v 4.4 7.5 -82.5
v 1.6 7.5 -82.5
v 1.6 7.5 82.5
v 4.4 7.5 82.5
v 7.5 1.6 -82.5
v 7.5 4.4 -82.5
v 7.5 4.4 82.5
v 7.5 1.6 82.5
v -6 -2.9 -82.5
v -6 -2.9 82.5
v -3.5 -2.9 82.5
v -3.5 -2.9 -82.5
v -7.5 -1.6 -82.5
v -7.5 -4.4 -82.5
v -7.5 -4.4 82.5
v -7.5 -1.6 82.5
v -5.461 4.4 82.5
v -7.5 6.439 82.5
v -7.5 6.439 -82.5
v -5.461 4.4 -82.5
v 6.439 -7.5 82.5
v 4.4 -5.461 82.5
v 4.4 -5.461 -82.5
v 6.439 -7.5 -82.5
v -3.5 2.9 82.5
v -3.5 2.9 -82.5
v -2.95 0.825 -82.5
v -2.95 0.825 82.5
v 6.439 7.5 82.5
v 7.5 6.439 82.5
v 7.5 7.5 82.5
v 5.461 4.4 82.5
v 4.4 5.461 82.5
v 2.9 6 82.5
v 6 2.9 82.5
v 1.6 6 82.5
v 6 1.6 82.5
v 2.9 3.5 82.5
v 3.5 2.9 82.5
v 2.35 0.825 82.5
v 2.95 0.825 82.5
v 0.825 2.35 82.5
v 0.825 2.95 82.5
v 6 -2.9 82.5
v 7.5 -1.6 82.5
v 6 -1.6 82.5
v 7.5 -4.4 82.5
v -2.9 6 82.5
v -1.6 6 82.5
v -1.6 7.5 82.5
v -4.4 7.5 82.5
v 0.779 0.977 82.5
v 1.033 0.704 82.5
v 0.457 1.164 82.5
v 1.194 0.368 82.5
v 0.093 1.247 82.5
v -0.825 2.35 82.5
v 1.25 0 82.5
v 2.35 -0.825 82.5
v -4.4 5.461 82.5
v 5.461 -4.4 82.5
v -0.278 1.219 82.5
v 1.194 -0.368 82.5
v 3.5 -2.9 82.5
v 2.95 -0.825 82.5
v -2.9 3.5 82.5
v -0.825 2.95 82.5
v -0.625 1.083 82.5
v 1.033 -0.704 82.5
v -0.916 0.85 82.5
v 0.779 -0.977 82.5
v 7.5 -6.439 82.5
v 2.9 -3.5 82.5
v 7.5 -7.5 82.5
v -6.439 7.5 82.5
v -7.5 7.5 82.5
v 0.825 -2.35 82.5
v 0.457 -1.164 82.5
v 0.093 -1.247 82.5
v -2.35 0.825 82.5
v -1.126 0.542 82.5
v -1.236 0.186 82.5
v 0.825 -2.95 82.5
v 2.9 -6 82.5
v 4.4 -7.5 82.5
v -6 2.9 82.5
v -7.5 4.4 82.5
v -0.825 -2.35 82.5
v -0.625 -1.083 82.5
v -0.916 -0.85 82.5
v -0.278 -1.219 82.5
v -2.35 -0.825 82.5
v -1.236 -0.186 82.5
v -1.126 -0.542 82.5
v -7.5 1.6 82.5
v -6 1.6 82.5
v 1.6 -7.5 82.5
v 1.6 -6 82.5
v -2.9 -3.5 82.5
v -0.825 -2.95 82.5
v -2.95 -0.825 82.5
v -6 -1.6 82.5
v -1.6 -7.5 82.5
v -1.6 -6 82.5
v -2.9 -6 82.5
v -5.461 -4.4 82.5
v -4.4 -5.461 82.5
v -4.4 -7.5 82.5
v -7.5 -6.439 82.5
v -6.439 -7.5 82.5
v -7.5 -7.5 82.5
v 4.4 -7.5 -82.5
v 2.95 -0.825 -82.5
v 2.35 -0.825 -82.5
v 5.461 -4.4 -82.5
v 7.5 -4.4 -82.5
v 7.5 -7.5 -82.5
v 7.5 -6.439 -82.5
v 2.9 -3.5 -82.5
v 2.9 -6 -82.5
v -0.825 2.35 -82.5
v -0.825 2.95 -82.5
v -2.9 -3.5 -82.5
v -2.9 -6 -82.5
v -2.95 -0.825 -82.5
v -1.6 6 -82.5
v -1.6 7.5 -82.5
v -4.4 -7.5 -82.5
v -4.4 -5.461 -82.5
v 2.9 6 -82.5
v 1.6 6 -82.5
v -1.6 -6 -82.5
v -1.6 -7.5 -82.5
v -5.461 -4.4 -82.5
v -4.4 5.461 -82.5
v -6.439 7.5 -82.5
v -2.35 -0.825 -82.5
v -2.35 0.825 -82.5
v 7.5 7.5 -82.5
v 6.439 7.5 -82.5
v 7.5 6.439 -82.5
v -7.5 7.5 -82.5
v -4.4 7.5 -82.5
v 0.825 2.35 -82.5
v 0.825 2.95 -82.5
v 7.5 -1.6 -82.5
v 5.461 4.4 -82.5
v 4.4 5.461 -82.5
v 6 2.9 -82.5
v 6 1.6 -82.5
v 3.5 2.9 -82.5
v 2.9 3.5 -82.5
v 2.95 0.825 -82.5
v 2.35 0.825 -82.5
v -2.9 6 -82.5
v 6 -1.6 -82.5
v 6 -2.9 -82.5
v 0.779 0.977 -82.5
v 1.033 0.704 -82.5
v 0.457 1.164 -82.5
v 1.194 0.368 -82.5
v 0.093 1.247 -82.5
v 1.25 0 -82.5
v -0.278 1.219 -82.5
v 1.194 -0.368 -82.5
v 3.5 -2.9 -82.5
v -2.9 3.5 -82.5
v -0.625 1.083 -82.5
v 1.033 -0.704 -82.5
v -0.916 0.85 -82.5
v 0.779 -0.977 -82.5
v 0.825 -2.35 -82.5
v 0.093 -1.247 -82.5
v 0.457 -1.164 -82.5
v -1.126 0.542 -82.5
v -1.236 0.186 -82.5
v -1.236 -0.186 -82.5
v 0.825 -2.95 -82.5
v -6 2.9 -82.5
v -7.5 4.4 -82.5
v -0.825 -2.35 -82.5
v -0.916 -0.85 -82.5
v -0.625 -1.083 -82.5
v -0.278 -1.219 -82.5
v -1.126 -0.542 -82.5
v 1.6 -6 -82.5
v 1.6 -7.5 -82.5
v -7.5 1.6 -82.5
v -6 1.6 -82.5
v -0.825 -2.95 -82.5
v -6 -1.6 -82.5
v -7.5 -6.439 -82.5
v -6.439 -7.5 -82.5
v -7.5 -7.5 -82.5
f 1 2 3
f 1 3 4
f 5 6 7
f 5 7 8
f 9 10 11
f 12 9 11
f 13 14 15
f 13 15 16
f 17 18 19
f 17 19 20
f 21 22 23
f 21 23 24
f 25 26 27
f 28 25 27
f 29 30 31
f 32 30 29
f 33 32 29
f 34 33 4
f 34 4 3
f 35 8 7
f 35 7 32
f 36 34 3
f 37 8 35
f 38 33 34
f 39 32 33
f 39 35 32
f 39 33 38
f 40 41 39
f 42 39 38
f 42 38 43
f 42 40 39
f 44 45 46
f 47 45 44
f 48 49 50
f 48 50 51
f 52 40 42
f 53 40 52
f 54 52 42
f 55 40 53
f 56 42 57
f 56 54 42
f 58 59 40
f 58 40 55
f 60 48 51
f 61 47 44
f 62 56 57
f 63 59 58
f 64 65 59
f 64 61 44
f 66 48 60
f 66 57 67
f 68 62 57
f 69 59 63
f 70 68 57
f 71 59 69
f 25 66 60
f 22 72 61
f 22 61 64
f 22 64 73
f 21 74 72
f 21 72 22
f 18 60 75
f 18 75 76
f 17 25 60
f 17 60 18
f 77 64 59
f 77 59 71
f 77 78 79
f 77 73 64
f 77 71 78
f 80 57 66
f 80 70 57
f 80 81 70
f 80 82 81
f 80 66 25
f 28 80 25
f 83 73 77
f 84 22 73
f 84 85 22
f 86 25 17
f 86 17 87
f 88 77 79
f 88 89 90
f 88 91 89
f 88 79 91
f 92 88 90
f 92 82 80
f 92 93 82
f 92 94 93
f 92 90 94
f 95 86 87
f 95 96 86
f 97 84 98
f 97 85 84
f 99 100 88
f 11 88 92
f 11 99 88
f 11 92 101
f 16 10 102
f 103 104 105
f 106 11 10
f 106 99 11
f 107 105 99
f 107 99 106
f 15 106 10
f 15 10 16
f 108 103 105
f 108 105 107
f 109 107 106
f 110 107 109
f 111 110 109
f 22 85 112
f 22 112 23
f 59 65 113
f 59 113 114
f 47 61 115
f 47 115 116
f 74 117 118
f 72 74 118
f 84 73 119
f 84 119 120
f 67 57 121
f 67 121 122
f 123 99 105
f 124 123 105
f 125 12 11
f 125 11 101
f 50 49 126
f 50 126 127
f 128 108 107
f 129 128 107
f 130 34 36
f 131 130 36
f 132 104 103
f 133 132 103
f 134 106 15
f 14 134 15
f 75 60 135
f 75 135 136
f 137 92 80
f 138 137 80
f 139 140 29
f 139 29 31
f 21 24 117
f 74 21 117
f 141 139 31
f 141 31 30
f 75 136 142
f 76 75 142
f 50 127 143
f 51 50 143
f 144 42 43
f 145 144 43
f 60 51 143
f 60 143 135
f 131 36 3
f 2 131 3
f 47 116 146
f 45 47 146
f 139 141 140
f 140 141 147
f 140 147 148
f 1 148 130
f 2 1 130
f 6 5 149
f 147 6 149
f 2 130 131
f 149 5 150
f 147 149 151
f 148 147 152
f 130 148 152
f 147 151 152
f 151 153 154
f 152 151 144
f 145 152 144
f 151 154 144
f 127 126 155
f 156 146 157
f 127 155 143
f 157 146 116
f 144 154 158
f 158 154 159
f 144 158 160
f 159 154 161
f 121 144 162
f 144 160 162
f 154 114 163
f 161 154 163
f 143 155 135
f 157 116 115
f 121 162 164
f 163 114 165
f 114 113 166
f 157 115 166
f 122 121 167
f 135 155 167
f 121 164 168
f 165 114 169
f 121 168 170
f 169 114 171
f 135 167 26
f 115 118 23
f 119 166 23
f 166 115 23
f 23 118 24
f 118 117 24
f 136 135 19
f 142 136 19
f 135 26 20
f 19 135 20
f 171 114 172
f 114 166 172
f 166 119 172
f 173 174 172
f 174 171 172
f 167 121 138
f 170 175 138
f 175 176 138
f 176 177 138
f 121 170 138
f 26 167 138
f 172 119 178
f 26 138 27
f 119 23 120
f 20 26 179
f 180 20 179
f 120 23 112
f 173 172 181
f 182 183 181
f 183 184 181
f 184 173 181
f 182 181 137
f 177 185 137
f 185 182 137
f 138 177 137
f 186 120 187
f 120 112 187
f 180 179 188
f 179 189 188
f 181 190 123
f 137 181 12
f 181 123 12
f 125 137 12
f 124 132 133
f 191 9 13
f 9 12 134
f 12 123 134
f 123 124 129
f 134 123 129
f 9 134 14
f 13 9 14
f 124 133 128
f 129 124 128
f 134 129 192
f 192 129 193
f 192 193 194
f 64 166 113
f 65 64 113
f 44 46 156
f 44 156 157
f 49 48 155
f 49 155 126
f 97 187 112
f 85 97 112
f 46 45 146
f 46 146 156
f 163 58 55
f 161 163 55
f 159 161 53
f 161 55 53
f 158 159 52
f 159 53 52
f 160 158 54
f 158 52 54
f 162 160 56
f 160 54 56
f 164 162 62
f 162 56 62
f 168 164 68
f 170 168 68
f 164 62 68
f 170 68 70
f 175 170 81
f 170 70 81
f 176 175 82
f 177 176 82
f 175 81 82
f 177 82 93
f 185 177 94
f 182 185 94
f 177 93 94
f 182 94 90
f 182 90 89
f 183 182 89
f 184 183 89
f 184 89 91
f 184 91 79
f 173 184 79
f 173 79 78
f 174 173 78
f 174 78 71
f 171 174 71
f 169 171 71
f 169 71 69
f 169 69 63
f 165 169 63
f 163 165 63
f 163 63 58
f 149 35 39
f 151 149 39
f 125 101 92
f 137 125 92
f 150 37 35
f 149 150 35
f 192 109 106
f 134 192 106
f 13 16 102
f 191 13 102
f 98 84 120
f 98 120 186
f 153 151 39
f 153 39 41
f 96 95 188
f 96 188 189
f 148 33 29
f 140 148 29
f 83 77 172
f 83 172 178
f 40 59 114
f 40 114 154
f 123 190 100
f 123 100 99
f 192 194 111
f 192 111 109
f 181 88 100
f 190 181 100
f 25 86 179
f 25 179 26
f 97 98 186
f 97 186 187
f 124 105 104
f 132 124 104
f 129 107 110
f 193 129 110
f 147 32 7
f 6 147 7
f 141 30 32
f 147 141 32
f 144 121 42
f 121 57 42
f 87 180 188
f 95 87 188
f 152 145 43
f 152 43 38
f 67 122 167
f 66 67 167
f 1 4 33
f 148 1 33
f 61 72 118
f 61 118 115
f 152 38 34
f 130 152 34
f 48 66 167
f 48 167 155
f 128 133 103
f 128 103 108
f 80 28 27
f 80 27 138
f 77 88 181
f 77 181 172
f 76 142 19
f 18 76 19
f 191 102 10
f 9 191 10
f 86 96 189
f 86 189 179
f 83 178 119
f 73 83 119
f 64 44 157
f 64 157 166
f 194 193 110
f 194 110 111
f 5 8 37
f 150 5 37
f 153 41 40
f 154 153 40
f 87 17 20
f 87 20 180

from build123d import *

# Parameters (mm, degrees)
RESSALTO_EXTRUS_O1_DEPTH   = 82.5
ESPELHAR2_COPY_1_DEPTH     = 82.5
ESBO_O2_R                  = 1.25
CORTE_EXTRUS_O1_DEPTH      = 1
CORTE_EXTRUS_O1_DEPTH_BACK = 166


with BuildPart() as part:
    # Esboço1 → Ressalto-extrusão1 (new body, symmetric)
    with BuildSketch(Plane.XY):
        Polygon((0, 2.35), (-0.825, 2.35), (-0.825, 2.95), (-2.9, 3.5), (-2.9, 6), (-1.6, 6), (-1.6, 7.5), (-4.4, 7.5), (-4.4, 5.460660172), (-6.439339828, 7.5), (-7.5, 7.5), (-7.5, 6.439339828), (-5.460660172, 4.4), (-7.5, 4.4), (-7.5, 1.6), (-6, 1.6), (-6, 2.9), (-3.5, 2.9), (-2.95, 0.825), (-2.35, 0.825), (-2.35, 0), (0, 0), align=None)
    ressalto_extrus_o1 = extrude(amount=RESSALTO_EXTRUS_O1_DEPTH, both=True)

    # Espelhar1: Ressalto-extrusão1 across plane
    add(ressalto_extrus_o1.mirror(Plane.ZX))

    # Espelhar2: Ressalto-extrusão1 across plane
    add(ressalto_extrus_o1.mirror(Plane(origin=(0, 0, 0), x_dir=(0, 0, 1), z_dir=(1, 0, 0))))

    # Espelhar2 copy 1 sketch → Espelhar2 copy 1 (add, symmetric)
    with BuildSketch(Plane(origin=(0, 0, 0), x_dir=(-1, 0, 0), z_dir=(0, 0, 1))):
        Polygon((0, 2.35), (-0.825, 2.35), (-0.825, 2.95), (-2.9, 3.5), (-2.9, 6), (-1.6, 6), (-1.6, 7.5), (-4.4, 7.5), (-4.4, 5.460660172), (-6.439339828, 7.5), (-7.5, 7.5), (-7.5, 6.439339828), (-5.460660172, 4.4), (-7.5, 4.4), (-7.5, 1.6), (-6, 1.6), (-6, 2.9), (-3.5, 2.9), (-2.95, 0.825), (-2.35, 0.825), (-2.35, 0), (0, 0), align=None)
    extrude(amount=ESPELHAR2_COPY_1_DEPTH, both=True)

    # Esboço2 → Corte-extrusão1 (cut, two sides)
    with BuildSketch(Plane.XY.offset(82.5)) as corte_extrus_o1_sk:
        Circle(ESBO_O2_R)
    extrude(amount=CORTE_EXTRUS_O1_DEPTH, mode=Mode.SUBTRACT)
    extrude(corte_extrus_o1_sk.sketch, amount=-CORTE_EXTRUS_O1_DEPTH_BACK, mode=Mode.SUBTRACT)


solid = part.part
